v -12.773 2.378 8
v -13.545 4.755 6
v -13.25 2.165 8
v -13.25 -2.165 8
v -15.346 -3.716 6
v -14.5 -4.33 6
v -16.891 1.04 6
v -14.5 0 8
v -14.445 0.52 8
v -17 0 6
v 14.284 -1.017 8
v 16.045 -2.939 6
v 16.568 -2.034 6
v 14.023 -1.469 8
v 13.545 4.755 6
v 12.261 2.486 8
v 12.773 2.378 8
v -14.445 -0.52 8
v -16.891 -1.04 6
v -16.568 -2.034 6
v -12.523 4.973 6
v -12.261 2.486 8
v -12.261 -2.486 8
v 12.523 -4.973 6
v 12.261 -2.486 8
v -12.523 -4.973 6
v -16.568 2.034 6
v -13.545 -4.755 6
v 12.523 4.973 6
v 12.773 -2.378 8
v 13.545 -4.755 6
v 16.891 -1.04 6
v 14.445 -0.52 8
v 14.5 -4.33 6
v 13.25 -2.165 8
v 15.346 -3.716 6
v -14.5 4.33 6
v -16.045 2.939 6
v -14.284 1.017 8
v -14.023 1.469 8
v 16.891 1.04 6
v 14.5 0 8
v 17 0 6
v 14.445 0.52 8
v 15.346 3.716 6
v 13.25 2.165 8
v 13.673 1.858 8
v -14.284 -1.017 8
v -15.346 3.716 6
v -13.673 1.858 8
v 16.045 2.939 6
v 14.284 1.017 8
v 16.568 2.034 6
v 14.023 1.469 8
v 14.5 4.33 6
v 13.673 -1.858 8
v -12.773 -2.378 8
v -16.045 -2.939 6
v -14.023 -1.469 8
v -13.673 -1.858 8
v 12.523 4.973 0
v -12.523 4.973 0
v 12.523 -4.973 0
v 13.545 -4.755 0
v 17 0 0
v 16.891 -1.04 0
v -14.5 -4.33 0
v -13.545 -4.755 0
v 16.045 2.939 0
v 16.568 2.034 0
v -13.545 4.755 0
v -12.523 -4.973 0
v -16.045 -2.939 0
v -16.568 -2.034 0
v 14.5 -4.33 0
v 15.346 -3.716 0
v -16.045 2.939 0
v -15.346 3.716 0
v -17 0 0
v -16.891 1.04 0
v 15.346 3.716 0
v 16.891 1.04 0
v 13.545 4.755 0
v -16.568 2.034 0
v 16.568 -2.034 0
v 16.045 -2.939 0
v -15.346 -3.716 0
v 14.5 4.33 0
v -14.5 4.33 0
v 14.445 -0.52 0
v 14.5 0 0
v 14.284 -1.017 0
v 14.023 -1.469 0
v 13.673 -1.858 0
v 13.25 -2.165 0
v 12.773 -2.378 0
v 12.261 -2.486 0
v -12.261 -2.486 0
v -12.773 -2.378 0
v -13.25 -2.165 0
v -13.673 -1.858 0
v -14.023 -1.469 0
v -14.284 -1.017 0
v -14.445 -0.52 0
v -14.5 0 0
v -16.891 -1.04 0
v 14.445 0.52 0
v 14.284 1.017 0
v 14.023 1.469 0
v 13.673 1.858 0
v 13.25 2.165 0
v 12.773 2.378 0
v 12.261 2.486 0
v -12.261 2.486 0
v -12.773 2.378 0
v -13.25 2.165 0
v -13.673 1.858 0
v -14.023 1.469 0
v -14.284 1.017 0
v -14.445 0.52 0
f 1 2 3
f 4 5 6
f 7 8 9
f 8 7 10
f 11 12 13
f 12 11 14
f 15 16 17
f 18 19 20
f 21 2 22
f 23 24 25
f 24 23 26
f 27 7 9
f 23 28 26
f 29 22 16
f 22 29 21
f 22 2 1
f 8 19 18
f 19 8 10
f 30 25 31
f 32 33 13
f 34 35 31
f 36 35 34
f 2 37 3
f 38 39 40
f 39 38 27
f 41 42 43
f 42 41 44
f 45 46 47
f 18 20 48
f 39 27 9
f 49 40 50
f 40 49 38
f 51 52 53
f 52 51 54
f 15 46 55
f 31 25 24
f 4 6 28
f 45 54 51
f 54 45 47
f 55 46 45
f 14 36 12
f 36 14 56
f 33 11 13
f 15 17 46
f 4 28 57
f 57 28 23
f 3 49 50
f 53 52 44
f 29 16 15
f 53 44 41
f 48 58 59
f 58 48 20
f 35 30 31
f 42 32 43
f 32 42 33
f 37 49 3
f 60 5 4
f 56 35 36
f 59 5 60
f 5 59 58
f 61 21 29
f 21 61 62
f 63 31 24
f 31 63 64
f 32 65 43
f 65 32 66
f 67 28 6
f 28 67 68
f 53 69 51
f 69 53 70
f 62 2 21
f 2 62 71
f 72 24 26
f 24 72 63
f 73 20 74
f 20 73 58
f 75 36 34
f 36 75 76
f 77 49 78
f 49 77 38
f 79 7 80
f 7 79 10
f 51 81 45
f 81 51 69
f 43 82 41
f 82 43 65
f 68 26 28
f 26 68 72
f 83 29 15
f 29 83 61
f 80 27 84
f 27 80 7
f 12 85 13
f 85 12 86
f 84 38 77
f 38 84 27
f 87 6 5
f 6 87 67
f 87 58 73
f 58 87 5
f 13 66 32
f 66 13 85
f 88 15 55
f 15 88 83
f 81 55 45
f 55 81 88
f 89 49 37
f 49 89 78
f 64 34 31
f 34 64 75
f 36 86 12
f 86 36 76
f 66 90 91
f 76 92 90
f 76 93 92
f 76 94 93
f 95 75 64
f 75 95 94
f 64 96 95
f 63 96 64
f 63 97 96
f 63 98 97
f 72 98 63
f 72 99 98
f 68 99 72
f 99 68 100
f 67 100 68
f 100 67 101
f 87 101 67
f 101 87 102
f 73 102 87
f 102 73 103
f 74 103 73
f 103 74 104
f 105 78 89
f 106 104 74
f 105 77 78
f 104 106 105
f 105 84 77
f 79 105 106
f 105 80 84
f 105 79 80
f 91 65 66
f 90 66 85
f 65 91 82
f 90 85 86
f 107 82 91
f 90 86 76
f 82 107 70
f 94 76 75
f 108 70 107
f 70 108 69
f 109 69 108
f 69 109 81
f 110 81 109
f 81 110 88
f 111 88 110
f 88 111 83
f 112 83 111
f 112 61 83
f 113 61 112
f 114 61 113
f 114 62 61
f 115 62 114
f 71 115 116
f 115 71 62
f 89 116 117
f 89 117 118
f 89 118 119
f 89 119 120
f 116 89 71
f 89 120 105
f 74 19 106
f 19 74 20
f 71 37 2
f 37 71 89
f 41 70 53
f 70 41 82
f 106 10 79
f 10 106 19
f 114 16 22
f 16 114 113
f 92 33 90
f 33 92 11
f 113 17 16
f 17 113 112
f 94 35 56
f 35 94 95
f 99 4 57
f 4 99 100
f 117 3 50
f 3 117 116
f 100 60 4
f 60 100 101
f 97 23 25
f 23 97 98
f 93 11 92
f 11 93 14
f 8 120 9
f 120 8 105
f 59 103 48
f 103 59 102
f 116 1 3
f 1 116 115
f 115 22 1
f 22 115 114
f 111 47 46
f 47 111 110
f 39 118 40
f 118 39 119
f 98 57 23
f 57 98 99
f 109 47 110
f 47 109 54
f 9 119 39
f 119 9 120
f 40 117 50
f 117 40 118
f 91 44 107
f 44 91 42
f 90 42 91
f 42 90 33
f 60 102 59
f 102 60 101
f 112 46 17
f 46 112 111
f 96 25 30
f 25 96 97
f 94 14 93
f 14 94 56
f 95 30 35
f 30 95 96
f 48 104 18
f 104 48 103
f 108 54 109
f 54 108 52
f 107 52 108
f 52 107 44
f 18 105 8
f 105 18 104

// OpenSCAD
TOP_WIDTH = 5;
TOP_HEIGHT = 2;
BOT_WIDTH = 10;

HOLE_DIA = 5;
HOLE_SPACING = 24;
HEIGHT = 8;
LENGTH = 34;

$fn = 30;

module raiser() {
  difference() {
    union() {
      translate([0, 0, HEIGHT - TOP_HEIGHT])
      hull() {
      translate([-(LENGTH - BOT_WIDTH)/2, 0, 0])
      cylinder(d2 = TOP_WIDTH, d1 = BOT_WIDTH, h = TOP_HEIGHT);
      translate([(LENGTH - BOT_WIDTH)/2, 0, 0])
      cylinder(d2 = TOP_WIDTH, d1 = BOT_WIDTH, h = TOP_HEIGHT);
      }
      hull() {
        translate([-(LENGTH - BOT_WIDTH)/2, 0, 0])
        cylinder(d = BOT_WIDTH, h = HEIGHT - TOP_HEIGHT);
        translate([(LENGTH - BOT_WIDTH)/2, 0, 0])
        cylinder(d = BOT_WIDTH, h = HEIGHT - TOP_HEIGHT);

      }
    }

    hull() {
      translate([-HOLE_SPACING/2, 0, 0])
      cylinder(d = HOLE_DIA, h = HEIGHT);
      translate([HOLE_SPACING/2, 0, 0])
      cylinder(d = HOLE_DIA, h = HEIGHT);

    }
  }
}
raiser();
